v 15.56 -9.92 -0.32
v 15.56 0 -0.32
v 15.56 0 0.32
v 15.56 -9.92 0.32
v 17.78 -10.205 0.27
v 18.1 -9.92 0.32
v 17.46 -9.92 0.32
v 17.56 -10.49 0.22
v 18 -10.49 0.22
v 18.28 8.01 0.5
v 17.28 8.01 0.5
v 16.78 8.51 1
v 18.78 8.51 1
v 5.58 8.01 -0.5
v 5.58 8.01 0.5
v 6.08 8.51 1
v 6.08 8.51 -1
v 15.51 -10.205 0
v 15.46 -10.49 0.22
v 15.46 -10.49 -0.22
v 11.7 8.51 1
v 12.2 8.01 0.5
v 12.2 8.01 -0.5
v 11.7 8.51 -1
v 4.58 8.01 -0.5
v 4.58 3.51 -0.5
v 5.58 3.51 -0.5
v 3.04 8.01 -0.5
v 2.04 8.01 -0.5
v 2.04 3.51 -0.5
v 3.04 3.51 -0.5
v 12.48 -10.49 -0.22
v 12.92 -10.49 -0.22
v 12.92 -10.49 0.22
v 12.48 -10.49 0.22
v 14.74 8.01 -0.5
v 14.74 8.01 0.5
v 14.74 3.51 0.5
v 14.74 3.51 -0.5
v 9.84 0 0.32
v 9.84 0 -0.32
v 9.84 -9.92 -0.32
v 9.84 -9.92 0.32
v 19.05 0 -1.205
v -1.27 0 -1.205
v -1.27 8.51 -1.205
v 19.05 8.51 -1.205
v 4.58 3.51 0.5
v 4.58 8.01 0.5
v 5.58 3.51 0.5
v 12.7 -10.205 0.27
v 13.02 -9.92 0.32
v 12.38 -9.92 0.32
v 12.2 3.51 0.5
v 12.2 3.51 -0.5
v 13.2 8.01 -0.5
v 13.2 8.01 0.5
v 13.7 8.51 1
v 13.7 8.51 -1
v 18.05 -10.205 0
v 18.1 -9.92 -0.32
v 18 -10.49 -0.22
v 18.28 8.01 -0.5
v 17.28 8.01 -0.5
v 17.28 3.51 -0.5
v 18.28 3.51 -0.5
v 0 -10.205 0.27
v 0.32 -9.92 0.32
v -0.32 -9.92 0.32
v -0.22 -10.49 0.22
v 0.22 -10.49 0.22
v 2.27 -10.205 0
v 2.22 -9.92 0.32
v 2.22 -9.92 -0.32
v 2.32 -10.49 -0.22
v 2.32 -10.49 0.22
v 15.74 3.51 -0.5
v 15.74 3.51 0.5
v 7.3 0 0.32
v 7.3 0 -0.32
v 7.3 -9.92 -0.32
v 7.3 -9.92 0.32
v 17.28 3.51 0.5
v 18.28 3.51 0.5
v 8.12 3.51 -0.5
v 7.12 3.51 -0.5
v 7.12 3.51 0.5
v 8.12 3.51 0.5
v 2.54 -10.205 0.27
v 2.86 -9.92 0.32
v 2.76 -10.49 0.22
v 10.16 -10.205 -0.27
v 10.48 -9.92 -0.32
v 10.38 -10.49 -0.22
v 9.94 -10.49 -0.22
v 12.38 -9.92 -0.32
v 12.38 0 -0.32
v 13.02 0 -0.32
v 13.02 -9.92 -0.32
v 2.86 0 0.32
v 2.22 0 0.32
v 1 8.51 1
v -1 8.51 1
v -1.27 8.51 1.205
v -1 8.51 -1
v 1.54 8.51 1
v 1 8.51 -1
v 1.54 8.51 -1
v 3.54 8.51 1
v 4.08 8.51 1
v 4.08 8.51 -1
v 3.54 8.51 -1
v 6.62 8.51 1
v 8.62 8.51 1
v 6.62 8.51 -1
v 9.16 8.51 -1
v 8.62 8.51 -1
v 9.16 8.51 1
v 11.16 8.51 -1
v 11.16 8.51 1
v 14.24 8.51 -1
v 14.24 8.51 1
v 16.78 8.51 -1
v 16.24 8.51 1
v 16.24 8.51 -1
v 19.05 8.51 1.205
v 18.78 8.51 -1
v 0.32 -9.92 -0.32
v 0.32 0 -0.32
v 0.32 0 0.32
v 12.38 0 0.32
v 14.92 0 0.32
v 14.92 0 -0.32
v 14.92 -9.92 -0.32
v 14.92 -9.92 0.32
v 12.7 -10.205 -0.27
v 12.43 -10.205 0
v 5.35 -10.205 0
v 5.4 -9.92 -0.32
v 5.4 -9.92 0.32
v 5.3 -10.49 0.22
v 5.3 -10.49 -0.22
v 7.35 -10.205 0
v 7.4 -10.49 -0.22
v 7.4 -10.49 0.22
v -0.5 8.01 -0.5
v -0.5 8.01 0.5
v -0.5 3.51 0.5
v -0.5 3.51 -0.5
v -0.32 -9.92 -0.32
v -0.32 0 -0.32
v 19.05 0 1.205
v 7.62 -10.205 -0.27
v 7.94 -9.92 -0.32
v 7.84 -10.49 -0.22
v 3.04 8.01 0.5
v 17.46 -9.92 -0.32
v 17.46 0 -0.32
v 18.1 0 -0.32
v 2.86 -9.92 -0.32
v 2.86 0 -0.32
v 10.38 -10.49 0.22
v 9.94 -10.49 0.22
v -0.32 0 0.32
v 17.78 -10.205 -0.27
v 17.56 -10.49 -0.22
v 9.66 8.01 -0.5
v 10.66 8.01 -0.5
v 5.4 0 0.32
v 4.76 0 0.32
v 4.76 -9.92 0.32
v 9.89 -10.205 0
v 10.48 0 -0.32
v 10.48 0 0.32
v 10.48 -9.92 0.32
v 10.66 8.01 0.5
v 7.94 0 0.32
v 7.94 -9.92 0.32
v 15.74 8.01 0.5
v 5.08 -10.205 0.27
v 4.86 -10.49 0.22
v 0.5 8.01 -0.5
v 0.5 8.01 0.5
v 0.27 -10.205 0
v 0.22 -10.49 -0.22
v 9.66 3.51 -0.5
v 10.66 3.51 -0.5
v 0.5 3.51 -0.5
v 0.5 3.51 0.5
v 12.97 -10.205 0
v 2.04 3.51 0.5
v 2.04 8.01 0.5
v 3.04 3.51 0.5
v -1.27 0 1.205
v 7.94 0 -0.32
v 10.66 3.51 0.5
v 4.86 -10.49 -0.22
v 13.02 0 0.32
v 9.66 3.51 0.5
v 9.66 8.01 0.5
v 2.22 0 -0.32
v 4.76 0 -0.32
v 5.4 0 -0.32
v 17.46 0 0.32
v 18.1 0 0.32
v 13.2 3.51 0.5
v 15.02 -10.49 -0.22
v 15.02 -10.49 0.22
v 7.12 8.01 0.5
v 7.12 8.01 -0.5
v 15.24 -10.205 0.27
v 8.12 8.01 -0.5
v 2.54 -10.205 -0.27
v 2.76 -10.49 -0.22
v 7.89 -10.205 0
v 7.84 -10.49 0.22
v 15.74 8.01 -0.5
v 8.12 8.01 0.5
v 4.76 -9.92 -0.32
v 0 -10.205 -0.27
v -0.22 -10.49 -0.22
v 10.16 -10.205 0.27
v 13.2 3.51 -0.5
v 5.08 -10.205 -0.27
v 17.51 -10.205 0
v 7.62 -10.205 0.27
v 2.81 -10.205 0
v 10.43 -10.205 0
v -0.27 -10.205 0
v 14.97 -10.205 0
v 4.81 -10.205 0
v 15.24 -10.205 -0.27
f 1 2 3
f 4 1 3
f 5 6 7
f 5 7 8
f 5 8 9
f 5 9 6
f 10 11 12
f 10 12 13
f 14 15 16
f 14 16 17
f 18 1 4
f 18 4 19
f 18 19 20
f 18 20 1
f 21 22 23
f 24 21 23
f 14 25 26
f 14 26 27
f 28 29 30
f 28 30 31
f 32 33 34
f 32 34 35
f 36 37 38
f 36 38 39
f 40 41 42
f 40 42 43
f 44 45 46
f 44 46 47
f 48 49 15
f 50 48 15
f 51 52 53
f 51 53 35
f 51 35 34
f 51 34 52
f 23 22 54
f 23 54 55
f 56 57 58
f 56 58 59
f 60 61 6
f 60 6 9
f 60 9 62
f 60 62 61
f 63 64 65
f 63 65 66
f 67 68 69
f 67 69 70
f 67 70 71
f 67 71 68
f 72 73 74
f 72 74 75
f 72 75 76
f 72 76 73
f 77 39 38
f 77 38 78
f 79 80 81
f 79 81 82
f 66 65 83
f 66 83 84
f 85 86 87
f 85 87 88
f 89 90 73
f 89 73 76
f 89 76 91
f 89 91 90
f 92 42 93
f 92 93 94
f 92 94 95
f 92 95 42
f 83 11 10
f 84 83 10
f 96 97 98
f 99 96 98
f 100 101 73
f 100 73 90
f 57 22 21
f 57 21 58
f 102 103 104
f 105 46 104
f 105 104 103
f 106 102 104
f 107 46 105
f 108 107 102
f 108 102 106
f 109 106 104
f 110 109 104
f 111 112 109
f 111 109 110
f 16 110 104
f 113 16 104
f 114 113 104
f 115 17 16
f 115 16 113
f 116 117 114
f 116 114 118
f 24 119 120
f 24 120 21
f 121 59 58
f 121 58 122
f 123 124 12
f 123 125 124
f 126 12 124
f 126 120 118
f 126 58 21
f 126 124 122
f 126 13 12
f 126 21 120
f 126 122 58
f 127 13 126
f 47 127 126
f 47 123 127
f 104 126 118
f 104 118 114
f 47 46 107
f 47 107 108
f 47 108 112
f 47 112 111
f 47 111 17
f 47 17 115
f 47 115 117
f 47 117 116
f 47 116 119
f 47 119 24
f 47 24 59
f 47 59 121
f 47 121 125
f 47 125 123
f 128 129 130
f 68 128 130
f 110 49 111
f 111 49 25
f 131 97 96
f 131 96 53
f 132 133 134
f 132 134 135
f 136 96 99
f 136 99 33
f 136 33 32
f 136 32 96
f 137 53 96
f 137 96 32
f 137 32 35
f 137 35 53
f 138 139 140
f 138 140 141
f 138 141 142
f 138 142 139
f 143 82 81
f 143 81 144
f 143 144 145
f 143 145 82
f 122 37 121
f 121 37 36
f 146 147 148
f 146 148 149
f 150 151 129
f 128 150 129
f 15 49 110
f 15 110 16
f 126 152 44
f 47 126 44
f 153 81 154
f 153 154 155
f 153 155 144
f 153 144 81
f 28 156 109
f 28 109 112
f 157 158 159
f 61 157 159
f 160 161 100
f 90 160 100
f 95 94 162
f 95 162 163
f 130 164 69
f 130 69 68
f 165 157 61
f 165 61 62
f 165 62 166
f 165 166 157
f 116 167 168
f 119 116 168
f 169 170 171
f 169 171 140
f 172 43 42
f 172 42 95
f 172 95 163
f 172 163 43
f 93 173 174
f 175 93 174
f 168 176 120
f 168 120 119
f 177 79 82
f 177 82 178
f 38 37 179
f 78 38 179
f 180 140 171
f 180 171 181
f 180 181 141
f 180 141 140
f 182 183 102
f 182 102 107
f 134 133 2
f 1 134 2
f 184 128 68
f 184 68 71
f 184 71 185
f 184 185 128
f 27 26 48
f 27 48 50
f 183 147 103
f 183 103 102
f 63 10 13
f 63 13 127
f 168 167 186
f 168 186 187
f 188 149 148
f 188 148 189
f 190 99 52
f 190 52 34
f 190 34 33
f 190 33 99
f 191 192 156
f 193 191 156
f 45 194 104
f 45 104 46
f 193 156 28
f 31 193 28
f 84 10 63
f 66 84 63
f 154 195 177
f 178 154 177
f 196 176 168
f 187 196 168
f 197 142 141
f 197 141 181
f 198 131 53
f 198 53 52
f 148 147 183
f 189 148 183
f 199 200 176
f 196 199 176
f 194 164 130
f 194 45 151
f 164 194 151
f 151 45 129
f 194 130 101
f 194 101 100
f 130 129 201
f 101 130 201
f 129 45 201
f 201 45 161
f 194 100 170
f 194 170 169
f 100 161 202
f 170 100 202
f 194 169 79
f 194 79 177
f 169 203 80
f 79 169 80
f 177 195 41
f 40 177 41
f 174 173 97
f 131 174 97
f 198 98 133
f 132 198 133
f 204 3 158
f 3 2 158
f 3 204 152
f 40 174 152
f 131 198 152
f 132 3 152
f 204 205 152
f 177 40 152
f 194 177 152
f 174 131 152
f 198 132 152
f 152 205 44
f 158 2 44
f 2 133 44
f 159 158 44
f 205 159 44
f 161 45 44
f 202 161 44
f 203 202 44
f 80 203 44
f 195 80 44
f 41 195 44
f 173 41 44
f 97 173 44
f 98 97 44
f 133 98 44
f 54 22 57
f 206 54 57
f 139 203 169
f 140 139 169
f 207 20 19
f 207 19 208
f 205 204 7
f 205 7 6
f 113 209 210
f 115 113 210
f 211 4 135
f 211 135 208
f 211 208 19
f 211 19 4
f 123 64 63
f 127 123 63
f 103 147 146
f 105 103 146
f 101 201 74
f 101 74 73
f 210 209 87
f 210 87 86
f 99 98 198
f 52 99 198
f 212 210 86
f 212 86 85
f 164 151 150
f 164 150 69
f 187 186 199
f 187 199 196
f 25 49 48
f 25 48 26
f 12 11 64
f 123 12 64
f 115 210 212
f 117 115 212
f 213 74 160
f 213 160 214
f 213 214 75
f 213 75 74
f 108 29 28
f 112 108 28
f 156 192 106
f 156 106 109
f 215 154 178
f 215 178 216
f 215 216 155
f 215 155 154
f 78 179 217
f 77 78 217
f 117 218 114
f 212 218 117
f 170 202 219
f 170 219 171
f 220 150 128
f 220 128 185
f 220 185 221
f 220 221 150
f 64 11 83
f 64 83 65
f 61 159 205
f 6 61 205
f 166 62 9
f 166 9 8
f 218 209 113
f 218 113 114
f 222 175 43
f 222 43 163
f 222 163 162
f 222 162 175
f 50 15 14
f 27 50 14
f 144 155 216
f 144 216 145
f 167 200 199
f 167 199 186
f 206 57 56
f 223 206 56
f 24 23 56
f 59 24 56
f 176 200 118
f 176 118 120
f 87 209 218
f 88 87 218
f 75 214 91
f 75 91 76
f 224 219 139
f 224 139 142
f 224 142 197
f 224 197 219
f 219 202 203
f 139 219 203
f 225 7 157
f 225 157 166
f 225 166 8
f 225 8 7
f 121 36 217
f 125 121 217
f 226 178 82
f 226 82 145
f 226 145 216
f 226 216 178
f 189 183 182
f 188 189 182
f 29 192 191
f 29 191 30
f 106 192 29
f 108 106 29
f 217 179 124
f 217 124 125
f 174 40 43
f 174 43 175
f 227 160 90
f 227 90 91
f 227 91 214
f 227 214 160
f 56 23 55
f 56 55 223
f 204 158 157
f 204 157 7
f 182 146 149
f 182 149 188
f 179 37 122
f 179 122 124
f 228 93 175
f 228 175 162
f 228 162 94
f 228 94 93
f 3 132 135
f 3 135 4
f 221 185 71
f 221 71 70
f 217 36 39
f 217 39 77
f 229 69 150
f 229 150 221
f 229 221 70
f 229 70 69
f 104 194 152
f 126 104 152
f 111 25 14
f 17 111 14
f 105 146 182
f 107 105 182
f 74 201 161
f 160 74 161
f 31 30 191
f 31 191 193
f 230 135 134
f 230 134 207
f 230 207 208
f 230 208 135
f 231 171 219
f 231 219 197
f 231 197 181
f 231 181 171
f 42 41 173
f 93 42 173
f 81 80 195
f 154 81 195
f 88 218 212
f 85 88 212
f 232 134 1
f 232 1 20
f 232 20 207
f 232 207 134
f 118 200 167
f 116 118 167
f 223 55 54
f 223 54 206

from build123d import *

# Parameters (mm, degrees)
SKETCH2_W                  = 20.32
SKETCH2_H                  = 2.41
BOSS_EXTRUDE1_DEPTH        = 8.51
SKETCH5_W                  = 1
SKETCH5_H                  = 1
CUT_EXTRUDE1_DEPTH         = 5
CHAMFER1_SIZE              = 0.5
LPATTERN3_COUNT            = 8
LPATTERN3_PITCH            = 2.54
CHAMFER1_OF_LPATTERN3_SIZE = 0.5
SKETCH11_W                 = 0.64
SKETCH11_H                 = 0.64
BOSS_EXTRUDE2_DEPTH        = 9.92
LPATTERN4_COUNT            = 8
LPATTERN4_PITCH            = 2.54


with BuildPart() as part:
    # Sketch2 → Boss-Extrude1 (new body)
    with BuildSketch(Plane(origin=(0, 0, 0), x_dir=(1, 0, 0), z_dir=(0, 1, 0))):
        with Locations((8.89, 0)):
            Rectangle(SKETCH2_W, SKETCH2_H)
    extrude(amount=BOSS_EXTRUDE1_DEPTH)

    # Sketch5 → Cut-Extrude1 (cut)
    with BuildSketch(Plane(origin=(0, 8.51, 0), x_dir=(1, 0, 0), z_dir=(0, 1, 0))):
        Rectangle(SKETCH5_W, SKETCH5_H)
    cut_extrude1 = extrude(amount=-CUT_EXTRUDE1_DEPTH, mode=Mode.SUBTRACT)

    # Chamfer1
    chamfer1_edges = [part.edges().sort_by_distance(p)[0] for p in [
        (0.5, 8.51, 0),
        (0, 8.51, -0.5),
        (-0.5, 8.51, 0),
        (0, 8.51, 0.5),
    ]]
    chamfer(chamfer1_edges, length=CHAMFER1_SIZE)

    # LPattern3: Cut-Extrude1 ×8
    with Locations(*[(i * LPATTERN3_PITCH, 0, 0) for i in range(1, LPATTERN3_COUNT)]):
        add(cut_extrude1, mode=Mode.SUBTRACT)

    # Chamfer1 of LPattern3
    chamfer1_of_lpattern3_edges = [part.edges().sort_by_distance(p)[0] for p in [
        (3.04, 8.51, 0),
        (2.54, 8.51, -0.5),
        (2.04, 8.51, 0),
        (2.54, 8.51, 0.5),
        (5.58, 8.51, 0),
        (5.08, 8.51, -0.5),
        (4.58, 8.51, 0),
        (5.08, 8.51, 0.5),
        (8.12, 8.51, 0),
        (7.62, 8.51, -0.5),
        (7.12, 8.51, 0),
        (7.62, 8.51, 0.5),
        (10.66, 8.51, 0),
        (10.16, 8.51, -0.5),
        (9.66, 8.51, 0),
        (10.16, 8.51, 0.5),
        (13.2, 8.51, 0),
        (12.7, 8.51, -0.5),
        (12.2, 8.51, 0),
        (12.7, 8.51, 0.5),
        (15.74, 8.51, 0),
        (15.24, 8.51, -0.5),
        (14.74, 8.51, 0),
        (15.24, 8.51, 0.5),
        (18.28, 8.51, 0),
        (17.78, 8.51, -0.5),
        (17.28, 8.51, 0),
        (17.78, 8.51, 0.5),
    ]]
    chamfer(chamfer1_of_lpattern3_edges, length=CHAMFER1_OF_LPATTERN3_SIZE)

    # Sketch11 → Boss-Extrude2 (add)
    with BuildSketch(Plane.XZ):
        Rectangle(SKETCH11_W, SKETCH11_H)
    boss_extrude2 = extrude(amount=BOSS_EXTRUDE2_DEPTH)

    # Sketch13 → Loft1 section 0
    with BuildSketch(Plane.XZ.offset(9.92)):
        with BuildLine():
            Line((0.32, -0.32), (0.32, 0.32))
            Line((0.32, 0.32), (-0.32, 0.32))
            Line((-0.32, 0.32), (-0.32, -0.32))
            Line((-0.32, -0.32), (0.32, -0.32))
        make_face()
    # Sketch14 → Loft1 section 1
    with BuildSketch(Plane(origin=(0, -10.49, 0), x_dir=(-1, 0, 0), z_dir=(0, -1, 0))):
        with BuildLine():
            Line((-0.22, 0.22), (0.22, 0.22))
            Line((0.22, 0.22), (0.22, -0.22))
            Line((0.22, -0.22), (-0.22, -0.22))
            Line((-0.22, -0.22), (-0.22, 0.22))
        make_face()
    loft1 = loft()

    # LPattern4: Boss-Extrude2, Loft1 ×8
    with Locations(*[(i * LPATTERN4_PITCH, 0, 0) for i in range(1, LPATTERN4_COUNT)]):
        add(boss_extrude2)
        add(loft1)


solid = part.part
